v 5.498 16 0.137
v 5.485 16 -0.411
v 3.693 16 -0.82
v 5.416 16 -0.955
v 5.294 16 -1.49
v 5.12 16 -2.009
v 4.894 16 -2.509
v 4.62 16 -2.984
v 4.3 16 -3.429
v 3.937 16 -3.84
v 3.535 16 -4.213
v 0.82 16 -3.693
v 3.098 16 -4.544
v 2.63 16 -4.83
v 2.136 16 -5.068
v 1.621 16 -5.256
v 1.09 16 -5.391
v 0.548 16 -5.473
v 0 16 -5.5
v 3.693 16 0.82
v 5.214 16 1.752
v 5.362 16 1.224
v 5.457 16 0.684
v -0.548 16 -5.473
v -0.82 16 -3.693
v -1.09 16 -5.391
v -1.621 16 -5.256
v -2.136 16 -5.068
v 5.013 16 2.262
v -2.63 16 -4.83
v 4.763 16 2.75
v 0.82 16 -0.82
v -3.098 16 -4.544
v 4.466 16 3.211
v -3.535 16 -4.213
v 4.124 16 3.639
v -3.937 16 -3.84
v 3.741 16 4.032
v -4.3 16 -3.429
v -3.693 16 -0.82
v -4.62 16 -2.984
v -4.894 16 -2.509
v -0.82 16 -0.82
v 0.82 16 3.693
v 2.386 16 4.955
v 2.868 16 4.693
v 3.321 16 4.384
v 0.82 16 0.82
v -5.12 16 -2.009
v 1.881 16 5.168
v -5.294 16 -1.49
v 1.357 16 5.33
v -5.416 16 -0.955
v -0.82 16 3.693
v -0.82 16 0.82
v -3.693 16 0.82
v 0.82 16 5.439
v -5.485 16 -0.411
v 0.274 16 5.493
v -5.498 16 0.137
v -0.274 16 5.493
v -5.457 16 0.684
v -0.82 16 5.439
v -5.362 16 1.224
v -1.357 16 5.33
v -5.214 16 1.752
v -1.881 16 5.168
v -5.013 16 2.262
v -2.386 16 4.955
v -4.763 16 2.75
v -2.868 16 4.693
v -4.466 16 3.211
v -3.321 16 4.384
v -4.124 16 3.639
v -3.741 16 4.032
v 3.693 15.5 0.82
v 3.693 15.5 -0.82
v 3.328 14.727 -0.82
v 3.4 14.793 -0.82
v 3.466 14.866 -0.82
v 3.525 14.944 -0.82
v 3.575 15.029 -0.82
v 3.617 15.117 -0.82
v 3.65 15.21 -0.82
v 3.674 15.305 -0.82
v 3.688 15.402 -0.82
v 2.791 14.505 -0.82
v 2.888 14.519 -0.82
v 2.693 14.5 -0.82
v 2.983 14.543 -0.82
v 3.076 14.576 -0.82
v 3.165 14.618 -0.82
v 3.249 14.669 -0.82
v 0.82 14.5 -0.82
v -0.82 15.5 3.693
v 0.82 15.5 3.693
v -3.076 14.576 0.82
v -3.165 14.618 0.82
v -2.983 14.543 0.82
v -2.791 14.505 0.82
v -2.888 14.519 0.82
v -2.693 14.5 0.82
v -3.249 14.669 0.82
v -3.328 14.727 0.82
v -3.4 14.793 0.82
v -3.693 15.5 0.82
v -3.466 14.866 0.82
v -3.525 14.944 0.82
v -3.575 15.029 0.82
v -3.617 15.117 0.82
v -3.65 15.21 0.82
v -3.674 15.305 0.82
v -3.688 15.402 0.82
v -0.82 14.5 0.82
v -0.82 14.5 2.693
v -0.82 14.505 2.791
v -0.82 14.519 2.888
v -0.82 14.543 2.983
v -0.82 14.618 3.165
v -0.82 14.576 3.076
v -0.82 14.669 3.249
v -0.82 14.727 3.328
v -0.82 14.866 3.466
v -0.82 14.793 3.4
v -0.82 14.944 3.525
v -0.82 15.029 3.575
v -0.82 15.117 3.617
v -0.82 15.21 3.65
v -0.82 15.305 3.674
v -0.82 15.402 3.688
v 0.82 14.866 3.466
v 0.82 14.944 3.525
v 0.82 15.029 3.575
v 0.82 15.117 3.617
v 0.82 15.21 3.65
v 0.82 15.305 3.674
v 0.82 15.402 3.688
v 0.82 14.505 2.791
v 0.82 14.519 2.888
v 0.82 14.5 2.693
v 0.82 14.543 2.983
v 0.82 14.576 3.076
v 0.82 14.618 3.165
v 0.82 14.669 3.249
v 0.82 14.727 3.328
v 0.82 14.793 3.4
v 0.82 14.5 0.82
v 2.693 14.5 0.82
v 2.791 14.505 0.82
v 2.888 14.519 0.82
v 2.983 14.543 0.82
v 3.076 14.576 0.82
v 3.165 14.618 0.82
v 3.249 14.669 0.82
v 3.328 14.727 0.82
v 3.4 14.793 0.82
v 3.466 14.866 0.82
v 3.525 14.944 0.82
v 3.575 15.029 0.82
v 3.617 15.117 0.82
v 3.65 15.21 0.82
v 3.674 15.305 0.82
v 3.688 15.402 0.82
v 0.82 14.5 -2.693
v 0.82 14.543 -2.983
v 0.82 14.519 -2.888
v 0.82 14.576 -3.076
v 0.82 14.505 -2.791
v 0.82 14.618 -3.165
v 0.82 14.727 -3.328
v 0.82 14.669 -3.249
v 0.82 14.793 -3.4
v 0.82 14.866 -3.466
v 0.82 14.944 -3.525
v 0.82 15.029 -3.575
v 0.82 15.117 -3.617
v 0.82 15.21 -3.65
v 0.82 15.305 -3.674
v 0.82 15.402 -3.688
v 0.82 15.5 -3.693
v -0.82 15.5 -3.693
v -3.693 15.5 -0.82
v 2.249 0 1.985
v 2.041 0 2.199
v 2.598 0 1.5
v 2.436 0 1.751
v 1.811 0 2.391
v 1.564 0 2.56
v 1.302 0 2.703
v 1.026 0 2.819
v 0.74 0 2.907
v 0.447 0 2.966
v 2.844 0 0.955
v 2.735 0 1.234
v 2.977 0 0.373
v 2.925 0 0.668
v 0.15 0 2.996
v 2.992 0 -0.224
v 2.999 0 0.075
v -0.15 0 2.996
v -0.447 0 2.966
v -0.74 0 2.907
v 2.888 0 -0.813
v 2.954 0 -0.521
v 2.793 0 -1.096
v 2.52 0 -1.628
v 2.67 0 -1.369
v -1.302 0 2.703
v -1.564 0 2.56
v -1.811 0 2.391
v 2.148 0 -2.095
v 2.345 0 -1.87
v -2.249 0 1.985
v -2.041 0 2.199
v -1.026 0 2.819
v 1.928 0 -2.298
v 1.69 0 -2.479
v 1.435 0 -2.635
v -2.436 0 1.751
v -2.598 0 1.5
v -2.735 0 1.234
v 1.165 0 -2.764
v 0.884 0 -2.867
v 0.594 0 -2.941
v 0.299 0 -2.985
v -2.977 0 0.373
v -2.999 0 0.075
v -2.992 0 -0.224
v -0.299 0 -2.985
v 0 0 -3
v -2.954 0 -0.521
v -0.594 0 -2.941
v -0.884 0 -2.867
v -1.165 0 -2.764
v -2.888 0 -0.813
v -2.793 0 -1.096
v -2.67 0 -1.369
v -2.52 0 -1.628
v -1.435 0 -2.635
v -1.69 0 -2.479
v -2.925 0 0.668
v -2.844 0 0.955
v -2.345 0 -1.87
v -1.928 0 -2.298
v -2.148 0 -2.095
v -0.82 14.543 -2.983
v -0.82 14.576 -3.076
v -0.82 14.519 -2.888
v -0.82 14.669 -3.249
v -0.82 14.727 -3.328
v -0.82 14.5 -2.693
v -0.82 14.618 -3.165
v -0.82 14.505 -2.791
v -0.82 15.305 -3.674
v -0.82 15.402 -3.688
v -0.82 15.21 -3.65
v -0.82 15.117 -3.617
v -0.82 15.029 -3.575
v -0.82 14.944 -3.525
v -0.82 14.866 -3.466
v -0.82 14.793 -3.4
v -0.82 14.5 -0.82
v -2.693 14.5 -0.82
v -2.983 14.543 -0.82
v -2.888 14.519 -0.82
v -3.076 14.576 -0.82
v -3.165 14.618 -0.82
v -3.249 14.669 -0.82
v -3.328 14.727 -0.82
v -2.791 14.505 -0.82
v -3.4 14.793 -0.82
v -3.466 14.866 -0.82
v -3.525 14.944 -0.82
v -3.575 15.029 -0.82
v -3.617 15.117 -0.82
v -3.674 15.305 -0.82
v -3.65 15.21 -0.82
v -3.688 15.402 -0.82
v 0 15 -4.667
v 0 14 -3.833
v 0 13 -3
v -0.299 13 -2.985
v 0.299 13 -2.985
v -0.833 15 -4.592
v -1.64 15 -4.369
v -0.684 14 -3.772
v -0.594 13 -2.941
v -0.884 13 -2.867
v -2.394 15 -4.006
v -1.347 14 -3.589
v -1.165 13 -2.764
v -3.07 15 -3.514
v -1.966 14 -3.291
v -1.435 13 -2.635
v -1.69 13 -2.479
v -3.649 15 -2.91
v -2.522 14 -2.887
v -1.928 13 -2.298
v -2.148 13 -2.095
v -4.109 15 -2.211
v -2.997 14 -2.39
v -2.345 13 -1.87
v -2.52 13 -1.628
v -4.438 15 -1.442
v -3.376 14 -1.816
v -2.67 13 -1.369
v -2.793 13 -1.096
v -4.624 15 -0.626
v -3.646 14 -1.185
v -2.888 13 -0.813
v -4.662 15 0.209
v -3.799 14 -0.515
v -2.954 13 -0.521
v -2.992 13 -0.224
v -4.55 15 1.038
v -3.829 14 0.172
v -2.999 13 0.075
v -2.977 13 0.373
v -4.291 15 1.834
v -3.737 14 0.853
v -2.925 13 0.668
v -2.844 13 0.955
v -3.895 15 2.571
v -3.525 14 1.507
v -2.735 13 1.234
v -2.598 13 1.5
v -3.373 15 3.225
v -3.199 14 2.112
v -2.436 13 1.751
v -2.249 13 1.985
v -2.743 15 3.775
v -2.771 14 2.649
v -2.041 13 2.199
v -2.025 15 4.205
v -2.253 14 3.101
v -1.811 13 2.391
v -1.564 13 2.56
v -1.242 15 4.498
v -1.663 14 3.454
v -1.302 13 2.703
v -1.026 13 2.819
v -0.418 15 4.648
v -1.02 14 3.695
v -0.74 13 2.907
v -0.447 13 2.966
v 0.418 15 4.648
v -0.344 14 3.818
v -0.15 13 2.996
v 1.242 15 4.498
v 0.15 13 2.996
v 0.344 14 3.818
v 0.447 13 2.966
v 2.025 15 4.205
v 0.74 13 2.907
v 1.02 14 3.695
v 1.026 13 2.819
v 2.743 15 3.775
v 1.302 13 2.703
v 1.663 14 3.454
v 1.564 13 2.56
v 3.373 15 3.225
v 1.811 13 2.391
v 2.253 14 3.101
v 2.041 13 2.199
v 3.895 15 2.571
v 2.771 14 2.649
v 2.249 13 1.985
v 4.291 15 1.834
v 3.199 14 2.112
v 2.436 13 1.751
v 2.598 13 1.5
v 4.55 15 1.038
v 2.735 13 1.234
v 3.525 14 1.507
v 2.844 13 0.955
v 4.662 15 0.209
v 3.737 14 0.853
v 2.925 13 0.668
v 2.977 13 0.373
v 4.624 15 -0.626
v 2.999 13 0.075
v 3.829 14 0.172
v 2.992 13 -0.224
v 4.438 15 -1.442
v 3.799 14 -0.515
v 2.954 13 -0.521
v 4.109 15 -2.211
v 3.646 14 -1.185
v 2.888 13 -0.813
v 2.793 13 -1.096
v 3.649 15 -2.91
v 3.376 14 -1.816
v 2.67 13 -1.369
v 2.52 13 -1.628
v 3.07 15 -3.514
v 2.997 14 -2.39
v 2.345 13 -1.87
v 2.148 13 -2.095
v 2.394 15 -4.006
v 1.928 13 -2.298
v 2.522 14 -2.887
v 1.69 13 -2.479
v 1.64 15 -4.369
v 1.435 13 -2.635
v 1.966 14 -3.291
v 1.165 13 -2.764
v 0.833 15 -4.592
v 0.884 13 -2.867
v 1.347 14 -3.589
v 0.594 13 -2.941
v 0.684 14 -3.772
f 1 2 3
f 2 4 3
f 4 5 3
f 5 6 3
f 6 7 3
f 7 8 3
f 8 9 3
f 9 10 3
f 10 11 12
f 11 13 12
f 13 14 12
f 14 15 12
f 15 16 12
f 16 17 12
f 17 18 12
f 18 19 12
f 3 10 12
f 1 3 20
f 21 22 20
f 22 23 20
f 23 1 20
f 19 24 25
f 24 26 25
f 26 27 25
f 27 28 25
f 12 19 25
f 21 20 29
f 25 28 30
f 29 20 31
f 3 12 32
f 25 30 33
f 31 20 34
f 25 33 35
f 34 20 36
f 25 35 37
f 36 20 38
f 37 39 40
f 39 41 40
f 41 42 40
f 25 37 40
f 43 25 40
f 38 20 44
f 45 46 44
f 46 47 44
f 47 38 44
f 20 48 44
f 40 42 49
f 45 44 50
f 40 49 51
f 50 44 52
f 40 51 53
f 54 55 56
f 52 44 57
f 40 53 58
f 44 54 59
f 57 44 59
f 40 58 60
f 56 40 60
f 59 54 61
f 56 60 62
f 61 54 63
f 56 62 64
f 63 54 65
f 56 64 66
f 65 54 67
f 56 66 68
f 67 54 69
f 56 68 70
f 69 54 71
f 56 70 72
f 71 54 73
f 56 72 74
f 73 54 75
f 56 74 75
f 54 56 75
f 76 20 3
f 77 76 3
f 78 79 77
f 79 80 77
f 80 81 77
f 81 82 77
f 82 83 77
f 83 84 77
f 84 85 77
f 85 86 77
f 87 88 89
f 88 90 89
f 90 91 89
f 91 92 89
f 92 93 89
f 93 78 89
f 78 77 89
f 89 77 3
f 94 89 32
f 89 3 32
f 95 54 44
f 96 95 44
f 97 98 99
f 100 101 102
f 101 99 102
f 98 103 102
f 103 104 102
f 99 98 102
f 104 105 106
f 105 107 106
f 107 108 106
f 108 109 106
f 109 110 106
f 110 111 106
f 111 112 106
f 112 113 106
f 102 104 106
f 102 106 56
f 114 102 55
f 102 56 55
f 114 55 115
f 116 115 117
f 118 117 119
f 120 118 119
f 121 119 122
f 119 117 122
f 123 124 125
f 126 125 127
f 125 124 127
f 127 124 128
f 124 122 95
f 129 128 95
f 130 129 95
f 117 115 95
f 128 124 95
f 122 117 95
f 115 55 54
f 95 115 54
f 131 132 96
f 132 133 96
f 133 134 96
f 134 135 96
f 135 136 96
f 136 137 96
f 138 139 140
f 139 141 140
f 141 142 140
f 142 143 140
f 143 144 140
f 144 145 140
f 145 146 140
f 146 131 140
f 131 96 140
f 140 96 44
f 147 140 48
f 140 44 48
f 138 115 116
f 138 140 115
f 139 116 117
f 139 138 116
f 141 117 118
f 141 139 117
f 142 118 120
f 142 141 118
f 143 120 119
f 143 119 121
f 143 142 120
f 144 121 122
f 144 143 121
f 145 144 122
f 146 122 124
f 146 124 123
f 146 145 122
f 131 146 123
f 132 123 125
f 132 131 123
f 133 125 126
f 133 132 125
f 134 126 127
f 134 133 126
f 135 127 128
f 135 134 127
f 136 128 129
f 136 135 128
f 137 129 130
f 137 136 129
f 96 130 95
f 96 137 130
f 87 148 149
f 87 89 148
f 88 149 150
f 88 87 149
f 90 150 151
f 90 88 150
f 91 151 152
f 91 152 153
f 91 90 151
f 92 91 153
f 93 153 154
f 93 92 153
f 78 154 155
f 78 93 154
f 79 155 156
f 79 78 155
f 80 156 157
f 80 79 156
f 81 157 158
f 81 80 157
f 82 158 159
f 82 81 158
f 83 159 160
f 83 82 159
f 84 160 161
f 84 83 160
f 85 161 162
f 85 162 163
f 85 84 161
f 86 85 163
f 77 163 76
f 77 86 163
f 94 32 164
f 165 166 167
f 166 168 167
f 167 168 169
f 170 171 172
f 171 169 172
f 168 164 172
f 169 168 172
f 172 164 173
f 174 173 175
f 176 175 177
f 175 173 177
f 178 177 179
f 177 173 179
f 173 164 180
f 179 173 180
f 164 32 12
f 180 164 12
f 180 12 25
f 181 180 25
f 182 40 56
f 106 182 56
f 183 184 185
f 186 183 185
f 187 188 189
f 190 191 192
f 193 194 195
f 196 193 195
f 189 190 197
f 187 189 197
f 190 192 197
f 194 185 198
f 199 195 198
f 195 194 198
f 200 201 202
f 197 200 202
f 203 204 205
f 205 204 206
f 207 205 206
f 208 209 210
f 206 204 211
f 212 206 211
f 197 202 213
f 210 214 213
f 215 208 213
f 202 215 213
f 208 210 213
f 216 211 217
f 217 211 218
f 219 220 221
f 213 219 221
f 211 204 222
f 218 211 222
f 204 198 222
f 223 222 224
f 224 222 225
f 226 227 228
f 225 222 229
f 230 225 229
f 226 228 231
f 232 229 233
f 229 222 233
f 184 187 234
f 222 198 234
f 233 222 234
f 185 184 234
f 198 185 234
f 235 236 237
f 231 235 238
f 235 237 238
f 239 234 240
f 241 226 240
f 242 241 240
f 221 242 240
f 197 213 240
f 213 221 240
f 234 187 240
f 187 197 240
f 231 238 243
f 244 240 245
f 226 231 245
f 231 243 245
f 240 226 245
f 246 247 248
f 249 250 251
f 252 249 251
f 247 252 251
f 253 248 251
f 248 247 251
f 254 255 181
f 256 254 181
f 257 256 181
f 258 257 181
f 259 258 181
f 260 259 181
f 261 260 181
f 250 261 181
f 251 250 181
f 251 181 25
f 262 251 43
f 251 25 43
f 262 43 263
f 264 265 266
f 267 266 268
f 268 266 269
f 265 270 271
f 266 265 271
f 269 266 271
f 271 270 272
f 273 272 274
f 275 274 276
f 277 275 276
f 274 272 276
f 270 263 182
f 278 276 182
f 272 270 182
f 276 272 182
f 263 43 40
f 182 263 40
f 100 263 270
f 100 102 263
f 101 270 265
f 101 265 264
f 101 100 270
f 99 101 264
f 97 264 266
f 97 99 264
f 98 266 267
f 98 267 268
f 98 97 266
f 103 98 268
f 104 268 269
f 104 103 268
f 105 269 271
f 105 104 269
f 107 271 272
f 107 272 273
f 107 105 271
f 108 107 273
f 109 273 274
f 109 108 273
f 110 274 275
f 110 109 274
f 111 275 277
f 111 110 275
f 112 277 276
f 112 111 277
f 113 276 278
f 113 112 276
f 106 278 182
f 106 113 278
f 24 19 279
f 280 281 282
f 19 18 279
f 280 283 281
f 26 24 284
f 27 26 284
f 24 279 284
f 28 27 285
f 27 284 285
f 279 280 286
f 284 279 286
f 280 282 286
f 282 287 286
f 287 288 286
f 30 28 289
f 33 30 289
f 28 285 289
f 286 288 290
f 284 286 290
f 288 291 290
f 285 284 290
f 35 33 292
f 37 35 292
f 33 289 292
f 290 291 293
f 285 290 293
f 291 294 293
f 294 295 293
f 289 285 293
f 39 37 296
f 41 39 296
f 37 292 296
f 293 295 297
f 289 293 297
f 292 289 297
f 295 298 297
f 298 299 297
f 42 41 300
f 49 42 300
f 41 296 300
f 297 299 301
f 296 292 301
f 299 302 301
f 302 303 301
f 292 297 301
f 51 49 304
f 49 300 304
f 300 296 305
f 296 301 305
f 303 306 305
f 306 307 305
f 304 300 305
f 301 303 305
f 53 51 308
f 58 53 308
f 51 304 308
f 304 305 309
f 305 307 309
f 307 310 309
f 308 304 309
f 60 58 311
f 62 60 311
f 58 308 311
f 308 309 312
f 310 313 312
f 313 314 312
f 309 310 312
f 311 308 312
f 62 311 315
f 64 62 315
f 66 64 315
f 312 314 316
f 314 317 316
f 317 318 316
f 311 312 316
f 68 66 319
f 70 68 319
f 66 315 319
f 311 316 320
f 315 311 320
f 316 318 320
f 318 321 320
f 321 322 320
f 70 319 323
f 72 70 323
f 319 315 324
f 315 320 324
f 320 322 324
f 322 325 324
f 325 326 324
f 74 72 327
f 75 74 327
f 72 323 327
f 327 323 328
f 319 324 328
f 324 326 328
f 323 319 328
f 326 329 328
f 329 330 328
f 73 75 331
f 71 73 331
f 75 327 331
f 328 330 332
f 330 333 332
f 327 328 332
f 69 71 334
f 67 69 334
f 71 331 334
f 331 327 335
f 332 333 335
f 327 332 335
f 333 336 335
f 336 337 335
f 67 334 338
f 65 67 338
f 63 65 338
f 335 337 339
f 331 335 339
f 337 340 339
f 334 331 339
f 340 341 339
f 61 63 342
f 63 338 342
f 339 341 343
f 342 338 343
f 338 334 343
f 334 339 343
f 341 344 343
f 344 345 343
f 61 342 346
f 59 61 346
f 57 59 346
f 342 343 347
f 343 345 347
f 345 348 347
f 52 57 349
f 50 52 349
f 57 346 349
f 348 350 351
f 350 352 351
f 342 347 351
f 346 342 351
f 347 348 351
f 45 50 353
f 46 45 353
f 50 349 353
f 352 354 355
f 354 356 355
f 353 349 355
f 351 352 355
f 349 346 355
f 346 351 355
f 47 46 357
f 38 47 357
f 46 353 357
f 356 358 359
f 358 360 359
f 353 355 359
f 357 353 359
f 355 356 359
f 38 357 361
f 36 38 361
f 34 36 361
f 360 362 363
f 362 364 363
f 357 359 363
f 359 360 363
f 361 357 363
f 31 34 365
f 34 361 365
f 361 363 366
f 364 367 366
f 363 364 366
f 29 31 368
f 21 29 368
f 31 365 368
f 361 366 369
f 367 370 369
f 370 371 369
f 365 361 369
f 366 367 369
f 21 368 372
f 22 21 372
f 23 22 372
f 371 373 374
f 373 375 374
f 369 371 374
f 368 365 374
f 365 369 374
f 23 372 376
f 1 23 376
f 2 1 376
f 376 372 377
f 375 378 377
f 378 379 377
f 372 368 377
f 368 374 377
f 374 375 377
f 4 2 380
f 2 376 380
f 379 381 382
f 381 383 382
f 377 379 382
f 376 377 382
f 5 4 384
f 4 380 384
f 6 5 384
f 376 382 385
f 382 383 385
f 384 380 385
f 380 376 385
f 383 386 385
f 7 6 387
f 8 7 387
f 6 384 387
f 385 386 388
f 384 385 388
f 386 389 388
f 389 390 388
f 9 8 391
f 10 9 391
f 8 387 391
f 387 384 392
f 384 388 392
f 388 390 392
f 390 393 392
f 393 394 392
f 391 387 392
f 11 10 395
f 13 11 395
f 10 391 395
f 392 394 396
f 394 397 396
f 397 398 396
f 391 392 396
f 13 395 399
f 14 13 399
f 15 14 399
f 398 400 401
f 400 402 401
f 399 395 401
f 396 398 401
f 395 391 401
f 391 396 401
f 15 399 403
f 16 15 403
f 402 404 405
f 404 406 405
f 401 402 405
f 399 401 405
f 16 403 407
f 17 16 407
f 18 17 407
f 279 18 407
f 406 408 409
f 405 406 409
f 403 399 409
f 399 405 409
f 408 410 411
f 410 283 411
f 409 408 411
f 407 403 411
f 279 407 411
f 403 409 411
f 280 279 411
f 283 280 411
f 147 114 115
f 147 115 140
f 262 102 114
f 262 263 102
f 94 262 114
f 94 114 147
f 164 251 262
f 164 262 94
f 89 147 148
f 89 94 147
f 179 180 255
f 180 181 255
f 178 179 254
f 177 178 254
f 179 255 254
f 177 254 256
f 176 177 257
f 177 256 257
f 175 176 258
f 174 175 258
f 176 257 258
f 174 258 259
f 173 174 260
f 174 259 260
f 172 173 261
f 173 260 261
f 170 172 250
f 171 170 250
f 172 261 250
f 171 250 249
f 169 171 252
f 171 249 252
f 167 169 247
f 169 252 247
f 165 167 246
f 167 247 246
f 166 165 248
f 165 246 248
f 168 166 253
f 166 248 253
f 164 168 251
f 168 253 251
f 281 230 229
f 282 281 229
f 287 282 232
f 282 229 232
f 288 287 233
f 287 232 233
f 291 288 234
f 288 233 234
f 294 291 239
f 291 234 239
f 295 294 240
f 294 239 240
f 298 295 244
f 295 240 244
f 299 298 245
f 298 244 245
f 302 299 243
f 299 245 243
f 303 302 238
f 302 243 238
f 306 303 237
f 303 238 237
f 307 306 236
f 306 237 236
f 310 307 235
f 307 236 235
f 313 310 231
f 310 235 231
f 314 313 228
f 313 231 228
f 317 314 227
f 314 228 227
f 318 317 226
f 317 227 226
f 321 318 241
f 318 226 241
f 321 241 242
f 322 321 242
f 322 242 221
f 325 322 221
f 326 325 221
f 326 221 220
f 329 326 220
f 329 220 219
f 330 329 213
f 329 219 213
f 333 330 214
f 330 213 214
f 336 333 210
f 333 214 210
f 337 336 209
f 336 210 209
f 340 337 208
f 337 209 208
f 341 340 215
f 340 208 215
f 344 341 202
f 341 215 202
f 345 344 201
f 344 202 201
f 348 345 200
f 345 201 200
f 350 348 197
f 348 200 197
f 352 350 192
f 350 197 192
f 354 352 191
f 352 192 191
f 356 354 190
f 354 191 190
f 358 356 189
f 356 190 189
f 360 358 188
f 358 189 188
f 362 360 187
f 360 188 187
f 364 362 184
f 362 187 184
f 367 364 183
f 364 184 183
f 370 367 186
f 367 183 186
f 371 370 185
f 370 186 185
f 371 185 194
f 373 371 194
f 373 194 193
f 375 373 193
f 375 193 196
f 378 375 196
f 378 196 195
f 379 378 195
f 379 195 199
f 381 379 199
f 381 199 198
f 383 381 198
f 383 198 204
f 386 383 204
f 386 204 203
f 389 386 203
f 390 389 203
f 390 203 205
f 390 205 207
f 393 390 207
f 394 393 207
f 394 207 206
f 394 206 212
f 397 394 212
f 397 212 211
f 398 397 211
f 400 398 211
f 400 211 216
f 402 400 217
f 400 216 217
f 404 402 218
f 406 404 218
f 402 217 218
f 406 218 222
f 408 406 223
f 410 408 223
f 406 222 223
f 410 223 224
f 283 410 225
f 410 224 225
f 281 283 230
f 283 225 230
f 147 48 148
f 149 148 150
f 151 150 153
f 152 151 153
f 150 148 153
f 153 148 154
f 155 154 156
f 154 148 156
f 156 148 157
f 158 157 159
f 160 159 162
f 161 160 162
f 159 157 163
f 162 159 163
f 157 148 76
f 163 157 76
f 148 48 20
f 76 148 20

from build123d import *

# Parameters (mm, degrees)
SKETCH1_R           = 3
BOSS_EXTRUDE1_DEPTH = 13
CUT_EXTRUDE1_DEPTH  = 1.5
FILLET1_R           = 1
FILLET2_R           = 1
FILLET3_R           = 1
FILLET4_R           = 1


with BuildPart() as part:
    # Sketch1 → Boss-Extrude1 (new body)
    with BuildSketch(Plane(origin=(0, 0, 0), x_dir=(1, 0, 0), z_dir=(0, 1, 0))):
        with Locations(Location((0, 0, 0), (0, 0, 90))):
            Circle(SKETCH1_R)
    extrude(amount=BOSS_EXTRUDE1_DEPTH)

    # Sketch3 → Revolve2 (revolve)
    with BuildSketch(Plane.XY, mode=Mode.PRIVATE) as revolve2_sk:
        Polygon((0, 13), (0, 16), (-5.5, 16), (-3, 13), align=None)
    revolve(revolve2_sk.sketch.rotate(Axis((0, 13, 0), (0, 1, 0)), 270), axis=Axis((0, 13, 0), (0, 1, 0)))

    # Sketch4 → Cut-Extrude1 (cut)
    with BuildSketch(Plane(origin=(0, 16, 0), x_dir=(1, 0, 0), z_dir=(0, 1, 0))):
        Polygon((-0.819580165, 0.819580165), (-3.693115778, 0.819580165), (-3.693115778, -0.819580165), (-0.819580165, -0.819580165), (-0.819580165, -3.693115778), (0.819580165, -3.693115778), (0.819580165, -0.819580165), (3.693115778, -0.819580165), (3.693115778, 0.819580165), (0.819580165, 0.819580165), (0.819580165, 3.693115778), (-0.819580165, 3.693115778), align=None)
    extrude(amount=-CUT_EXTRUDE1_DEPTH, mode=Mode.SUBTRACT)

    # Fillet1
    fillet1_edges = [part.edges().sort_by_distance(p)[0] for p in [
        (0, 14.5, -3.693115778),
    ]]
    fillet(fillet1_edges, radius=FILLET1_R)

    # Fillet2
    fillet2_edges = [part.edges().sort_by_distance(p)[0] for p in [
        (3.693115778, 14.5, 0),
    ]]
    fillet(fillet2_edges, radius=FILLET2_R)

    # Fillet3
    fillet3_edges = [part.edges().sort_by_distance(p)[0] for p in [
        (0, 14.5, 3.693115778),
    ]]
    fillet(fillet3_edges, radius=FILLET3_R)

    # Fillet4
    fillet4_edges = [part.edges().sort_by_distance(p)[0] for p in [
        (-3.693115778, 14.5, 0),
    ]]
    fillet(fillet4_edges, radius=FILLET4_R)


solid = part.part
